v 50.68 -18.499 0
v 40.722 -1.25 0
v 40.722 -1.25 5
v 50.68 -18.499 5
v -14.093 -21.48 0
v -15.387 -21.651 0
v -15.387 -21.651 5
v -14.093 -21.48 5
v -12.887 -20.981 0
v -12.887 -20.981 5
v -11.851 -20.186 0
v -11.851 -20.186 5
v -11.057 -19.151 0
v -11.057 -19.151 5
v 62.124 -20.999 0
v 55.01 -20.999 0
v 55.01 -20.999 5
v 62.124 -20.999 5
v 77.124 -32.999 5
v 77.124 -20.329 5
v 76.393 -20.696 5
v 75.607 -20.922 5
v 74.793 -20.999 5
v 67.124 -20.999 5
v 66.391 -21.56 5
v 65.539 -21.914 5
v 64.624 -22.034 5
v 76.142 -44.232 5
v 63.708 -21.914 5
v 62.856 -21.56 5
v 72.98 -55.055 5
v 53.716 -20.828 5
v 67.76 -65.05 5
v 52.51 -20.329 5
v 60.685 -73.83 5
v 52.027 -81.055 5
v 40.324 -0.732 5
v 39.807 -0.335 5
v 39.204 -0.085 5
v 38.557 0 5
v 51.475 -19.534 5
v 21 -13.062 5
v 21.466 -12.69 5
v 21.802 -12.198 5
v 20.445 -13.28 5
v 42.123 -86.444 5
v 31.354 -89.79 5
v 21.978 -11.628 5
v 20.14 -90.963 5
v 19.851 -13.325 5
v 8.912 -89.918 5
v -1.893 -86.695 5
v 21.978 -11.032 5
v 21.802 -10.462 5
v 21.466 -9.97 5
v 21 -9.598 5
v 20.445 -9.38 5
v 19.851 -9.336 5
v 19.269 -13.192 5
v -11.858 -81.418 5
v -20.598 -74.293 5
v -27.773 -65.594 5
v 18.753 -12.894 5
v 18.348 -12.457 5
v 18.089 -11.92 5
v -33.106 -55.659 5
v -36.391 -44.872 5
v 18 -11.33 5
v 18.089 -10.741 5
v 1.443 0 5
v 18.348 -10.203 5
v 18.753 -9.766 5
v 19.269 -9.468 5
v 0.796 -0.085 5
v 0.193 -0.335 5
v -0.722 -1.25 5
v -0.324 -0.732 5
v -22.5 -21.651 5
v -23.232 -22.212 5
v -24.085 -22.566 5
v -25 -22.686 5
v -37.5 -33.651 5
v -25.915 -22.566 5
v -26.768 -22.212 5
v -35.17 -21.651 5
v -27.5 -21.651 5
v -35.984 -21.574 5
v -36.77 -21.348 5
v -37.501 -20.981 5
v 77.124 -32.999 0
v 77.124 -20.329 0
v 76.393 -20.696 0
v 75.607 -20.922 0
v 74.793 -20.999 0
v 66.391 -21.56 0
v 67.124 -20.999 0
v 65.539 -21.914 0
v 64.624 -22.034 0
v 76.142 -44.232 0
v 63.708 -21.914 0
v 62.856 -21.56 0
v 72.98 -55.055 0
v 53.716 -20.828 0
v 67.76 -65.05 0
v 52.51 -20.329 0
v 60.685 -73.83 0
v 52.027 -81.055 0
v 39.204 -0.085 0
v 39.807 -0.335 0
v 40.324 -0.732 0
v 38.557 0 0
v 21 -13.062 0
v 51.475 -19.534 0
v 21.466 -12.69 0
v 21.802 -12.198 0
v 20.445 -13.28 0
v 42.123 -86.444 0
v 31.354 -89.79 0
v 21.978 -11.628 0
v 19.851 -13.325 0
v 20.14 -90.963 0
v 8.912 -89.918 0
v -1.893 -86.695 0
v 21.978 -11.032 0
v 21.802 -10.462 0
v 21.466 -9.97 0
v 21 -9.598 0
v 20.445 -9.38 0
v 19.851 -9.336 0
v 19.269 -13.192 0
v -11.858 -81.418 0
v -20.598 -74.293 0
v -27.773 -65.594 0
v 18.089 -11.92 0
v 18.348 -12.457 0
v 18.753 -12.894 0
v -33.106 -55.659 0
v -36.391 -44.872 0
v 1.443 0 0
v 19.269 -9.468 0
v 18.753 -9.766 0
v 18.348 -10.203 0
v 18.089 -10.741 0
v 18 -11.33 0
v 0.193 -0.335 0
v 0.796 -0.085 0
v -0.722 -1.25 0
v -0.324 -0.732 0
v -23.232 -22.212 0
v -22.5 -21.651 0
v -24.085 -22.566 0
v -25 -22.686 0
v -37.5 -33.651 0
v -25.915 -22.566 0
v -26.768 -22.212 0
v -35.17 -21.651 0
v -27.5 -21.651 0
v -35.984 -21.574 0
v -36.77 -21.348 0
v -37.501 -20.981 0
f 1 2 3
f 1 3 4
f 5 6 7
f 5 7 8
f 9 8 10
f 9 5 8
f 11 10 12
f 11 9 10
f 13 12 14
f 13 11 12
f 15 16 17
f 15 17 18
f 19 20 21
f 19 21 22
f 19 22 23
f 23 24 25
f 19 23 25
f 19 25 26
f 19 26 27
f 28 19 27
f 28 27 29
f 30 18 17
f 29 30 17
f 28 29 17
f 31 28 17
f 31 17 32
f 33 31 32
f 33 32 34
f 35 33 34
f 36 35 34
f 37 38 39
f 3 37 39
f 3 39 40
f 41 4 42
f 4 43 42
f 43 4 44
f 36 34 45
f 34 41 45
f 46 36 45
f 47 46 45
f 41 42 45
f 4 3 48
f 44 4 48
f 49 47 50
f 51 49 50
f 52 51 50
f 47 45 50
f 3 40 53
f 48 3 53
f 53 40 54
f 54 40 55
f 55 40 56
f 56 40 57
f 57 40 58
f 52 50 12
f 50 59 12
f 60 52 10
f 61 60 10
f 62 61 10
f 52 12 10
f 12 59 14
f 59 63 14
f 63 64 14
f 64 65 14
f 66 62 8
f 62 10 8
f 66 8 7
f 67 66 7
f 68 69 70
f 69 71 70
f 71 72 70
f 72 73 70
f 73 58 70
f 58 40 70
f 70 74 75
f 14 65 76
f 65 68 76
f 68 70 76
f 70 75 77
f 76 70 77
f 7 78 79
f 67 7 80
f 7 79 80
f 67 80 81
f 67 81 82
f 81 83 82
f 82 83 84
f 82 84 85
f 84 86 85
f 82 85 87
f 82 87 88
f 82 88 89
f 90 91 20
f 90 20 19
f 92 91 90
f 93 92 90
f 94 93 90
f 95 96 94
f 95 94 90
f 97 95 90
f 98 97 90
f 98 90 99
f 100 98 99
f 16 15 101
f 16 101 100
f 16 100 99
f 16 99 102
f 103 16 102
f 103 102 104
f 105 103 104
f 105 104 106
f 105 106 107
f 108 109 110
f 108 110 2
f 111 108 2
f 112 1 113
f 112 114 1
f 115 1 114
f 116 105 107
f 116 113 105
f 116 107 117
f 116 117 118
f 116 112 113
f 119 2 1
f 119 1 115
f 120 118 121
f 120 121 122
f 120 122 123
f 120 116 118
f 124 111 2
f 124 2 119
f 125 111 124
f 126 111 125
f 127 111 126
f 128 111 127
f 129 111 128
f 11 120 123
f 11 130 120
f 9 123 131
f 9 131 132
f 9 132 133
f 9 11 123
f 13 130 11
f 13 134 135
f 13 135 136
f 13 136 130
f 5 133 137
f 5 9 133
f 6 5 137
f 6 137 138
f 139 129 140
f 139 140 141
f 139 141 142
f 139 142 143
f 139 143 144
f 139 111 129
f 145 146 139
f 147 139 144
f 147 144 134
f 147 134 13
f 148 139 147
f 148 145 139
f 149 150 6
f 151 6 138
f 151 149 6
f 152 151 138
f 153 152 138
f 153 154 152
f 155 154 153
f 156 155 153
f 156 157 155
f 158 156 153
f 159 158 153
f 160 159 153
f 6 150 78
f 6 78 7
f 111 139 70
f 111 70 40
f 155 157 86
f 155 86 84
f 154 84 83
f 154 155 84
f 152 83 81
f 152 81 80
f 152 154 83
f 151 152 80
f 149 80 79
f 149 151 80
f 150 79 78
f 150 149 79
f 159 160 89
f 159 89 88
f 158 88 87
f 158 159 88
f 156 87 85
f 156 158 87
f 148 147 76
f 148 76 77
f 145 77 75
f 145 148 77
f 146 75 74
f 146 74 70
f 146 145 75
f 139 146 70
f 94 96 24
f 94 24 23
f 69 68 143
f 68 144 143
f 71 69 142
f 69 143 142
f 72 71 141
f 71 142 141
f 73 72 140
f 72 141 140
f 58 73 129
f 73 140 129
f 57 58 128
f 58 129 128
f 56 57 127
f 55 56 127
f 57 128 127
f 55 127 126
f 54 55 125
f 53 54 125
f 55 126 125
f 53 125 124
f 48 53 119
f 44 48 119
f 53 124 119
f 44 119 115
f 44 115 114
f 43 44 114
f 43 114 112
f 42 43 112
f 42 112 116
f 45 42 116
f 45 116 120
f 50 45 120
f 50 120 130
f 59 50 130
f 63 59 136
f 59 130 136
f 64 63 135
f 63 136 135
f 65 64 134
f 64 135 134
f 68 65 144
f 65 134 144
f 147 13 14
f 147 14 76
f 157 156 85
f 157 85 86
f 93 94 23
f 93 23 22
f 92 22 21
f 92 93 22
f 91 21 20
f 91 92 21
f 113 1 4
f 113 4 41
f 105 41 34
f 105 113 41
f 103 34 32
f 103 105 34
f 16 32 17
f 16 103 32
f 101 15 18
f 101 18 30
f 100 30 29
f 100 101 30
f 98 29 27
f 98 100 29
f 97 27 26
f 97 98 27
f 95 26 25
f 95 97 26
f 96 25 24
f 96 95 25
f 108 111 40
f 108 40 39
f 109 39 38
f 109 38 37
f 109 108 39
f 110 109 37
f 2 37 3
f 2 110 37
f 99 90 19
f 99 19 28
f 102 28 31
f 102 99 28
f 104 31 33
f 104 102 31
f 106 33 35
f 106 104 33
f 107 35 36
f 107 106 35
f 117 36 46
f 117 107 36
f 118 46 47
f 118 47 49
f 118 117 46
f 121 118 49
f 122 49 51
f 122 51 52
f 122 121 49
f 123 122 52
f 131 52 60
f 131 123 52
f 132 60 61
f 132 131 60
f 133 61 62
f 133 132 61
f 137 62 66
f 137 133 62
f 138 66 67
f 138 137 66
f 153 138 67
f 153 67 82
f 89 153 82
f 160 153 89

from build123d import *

# Parameters (mm, degrees)
AUFSATZ_LINEAR_AUSTRAGEN1_DEPTH    = 5
F_4_0_4_DURCHMESSER_BOHRUNG1_D     = 4
F_4_0_4_DURCHMESSER_BOHRUNG1_DEPTH = 5
F_4_0_4_DURCHMESSER_BOHRUNG1_TIP   = 1.201721238


with BuildPart() as part:
    # Skizze2 → Aufsatz-Linear austragen1 (new body)
    with BuildSketch(Plane.XY):
        with BuildLine():
            Line((1.443375673, 0), (38.556624327, 0))
            ThreePointArc((38.556624327, 0), (39.806624327, -0.334936491), (40.721687836, -1.25))
            Line((40.721687836, -1.25), (50.680145631, -18.498554865))
            ThreePointArc((50.680145631, -18.498554865), (52.51027265, -20.328681884), (55.01027265, -20.998554865))
            Line((55.01027265, -20.998554865), (62.123521304, -20.998554865))
            ThreePointArc((62.123521304, -20.998554865), (64.623521304, -22.034088771), (67.123521304, -20.998554865))
            Line((67.123521304, -20.998554865), (74.793302349, -20.998554865))
            ThreePointArc((74.793302349, -20.998554865), (76.005598743, -20.827762698), (77.123521304, -20.328681884))
            Line((77.123521304, -20.328681884), (77.123521304, -32.998554865))
            ThreePointArc((77.123521304, -32.998554865), (20.139660848, -90.963323142), (-37.5, -33.650635095))
            Line((-37.5, -33.650635095), (-37.501029815, -20.980635095))
            ThreePointArc((-37.501029815, -20.980635095), (-36.382703591, -21.479811555), (-35.17, -21.650635095))
            Line((-35.17, -21.650635095), (-27.5, -21.650635095))
            ThreePointArc((-27.5, -21.650635095), (-25, -22.686169001), (-22.5, -21.650635095))
            Line((-22.5, -21.650635095), (-15.386751346, -21.650635095))
            ThreePointArc((-15.386751346, -21.650635095), (-12.886751346, -20.980762114), (-11.056624327, -19.150635095))
            Line((-11.056624327, -19.150635095), (-0.721687836, -1.25))
            ThreePointArc((-0.721687836, -1.25), (0.193375673, -0.334936491), (1.443375673, 0))
        make_face()
    extrude(amount=AUFSATZ_LINEAR_AUSTRAGEN1_DEPTH)

    # Ø4.0 (4) Durchmesser Bohrung1
    with Locations(Plane.XY.offset(5)):
        with Locations((20, -11.330104149)):
            Hole(F_4_0_4_DURCHMESSER_BOHRUNG1_D / 2, depth=F_4_0_4_DURCHMESSER_BOHRUNG1_DEPTH)
            with Locations((0, 0, -(F_4_0_4_DURCHMESSER_BOHRUNG1_DEPTH + F_4_0_4_DURCHMESSER_BOHRUNG1_TIP / 2))):  # 118° drill point
                Cone(0, F_4_0_4_DURCHMESSER_BOHRUNG1_D / 2, F_4_0_4_DURCHMESSER_BOHRUNG1_TIP, mode=Mode.SUBTRACT)


solid = part.part
